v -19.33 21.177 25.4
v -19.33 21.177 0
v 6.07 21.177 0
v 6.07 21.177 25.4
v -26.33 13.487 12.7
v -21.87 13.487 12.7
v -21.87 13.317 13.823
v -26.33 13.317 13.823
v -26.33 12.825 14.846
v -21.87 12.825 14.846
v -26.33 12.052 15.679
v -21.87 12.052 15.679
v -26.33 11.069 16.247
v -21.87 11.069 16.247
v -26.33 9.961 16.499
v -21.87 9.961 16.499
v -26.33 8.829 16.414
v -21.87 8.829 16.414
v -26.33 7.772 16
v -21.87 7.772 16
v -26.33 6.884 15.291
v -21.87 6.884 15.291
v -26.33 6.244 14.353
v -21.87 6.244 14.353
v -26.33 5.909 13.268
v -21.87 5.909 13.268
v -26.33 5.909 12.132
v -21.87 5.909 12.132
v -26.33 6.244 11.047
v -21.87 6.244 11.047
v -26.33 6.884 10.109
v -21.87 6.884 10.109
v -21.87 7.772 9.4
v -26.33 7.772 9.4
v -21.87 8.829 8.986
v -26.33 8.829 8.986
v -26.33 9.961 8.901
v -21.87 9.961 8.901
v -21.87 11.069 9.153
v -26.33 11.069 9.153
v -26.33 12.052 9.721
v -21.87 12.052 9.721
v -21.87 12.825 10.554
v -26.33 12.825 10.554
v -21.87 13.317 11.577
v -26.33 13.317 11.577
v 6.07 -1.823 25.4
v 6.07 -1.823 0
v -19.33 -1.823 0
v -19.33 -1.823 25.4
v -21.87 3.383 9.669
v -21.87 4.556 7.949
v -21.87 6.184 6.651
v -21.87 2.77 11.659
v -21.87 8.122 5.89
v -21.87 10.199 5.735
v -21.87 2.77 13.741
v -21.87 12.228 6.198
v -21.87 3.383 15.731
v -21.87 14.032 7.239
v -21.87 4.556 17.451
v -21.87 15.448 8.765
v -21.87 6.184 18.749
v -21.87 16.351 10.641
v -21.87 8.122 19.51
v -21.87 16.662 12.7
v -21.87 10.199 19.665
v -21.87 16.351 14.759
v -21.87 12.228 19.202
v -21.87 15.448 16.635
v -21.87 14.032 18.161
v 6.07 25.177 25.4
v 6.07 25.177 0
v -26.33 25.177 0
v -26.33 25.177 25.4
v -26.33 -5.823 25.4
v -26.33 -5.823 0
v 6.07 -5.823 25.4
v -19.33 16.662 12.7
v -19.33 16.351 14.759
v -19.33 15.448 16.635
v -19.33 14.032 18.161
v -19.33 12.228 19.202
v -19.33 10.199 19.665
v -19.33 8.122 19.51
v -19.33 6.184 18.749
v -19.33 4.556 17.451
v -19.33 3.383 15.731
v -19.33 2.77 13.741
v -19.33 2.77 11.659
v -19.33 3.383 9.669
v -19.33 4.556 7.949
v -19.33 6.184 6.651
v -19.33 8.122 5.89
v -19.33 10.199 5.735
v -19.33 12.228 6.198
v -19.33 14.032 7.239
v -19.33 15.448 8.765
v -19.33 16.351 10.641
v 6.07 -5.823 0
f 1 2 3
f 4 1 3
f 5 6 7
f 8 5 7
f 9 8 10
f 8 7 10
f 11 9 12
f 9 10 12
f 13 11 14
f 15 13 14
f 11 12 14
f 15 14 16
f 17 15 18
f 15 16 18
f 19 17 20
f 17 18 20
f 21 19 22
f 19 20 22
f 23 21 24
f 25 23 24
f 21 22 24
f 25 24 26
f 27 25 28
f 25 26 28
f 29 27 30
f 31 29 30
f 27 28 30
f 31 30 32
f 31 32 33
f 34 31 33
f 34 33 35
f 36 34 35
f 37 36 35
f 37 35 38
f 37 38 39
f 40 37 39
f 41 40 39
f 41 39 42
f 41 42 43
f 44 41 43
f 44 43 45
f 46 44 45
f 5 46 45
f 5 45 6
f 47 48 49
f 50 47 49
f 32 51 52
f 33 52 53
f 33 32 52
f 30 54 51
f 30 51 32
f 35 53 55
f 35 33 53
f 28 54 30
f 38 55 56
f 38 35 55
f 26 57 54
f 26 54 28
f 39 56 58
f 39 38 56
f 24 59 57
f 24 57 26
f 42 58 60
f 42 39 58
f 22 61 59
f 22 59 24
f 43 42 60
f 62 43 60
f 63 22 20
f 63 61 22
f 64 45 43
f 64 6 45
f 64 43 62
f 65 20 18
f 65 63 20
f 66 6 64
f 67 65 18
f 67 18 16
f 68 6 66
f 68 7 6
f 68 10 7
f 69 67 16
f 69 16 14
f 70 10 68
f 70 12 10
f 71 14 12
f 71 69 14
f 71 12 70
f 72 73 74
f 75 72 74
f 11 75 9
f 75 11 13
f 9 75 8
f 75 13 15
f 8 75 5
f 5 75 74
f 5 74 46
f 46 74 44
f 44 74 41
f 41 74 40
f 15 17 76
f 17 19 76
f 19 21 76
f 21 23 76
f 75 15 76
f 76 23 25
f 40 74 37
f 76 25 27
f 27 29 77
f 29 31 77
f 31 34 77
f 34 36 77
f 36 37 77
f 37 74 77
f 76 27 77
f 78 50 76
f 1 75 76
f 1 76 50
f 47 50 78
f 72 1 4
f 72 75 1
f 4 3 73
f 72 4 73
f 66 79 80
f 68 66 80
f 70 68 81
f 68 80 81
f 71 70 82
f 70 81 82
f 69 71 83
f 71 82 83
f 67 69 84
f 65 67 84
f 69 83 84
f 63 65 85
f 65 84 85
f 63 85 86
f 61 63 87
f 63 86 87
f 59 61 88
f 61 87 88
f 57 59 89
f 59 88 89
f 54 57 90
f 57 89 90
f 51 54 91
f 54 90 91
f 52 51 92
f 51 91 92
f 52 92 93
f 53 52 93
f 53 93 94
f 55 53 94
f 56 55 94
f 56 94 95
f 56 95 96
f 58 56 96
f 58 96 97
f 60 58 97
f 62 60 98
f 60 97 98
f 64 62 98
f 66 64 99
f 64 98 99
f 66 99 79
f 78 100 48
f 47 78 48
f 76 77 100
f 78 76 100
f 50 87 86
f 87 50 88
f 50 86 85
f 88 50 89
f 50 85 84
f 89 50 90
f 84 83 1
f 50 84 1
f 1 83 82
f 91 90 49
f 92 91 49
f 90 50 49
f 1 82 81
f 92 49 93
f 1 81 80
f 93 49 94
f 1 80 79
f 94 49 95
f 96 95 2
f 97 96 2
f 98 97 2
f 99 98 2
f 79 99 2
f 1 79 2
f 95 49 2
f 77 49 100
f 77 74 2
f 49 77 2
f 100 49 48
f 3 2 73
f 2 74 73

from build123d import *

# Parameters (mm, degrees)
F1_DEPTH = 25.4
F2_R     = 6.985
F2_R_2   = 3.81
F3_DEPTH = 2.54
F4_DEPTH = 7


with BuildPart() as f1:
    # F0 (on Top) → F1 (new body)
    with BuildSketch(Plane.XY):
        Polygon((-19.32979, -1.823446), (-19.32979, 21.176554), (6.07021, 21.176554), (6.07021, 25.176554), (-26.32979, 25.176554), (-26.32979, -5.823446), (6.07021, -5.823446), (6.07021, -1.823446), align=None)
    extrude(amount=F1_DEPTH)

    # F2 (on face) → F3 (cut)
    with BuildSketch(Plane.YZ.offset(-19.32979)):
        with Locations((9.676554, 12.7)):
            Circle(F2_R)
        with Locations((9.676554, 12.7)):
            Circle(F2_R_2, mode=Mode.SUBTRACT)
        with Locations((9.676554, 12.7)):
            Circle(F2_R_2)
    extrude(amount=-F3_DEPTH, mode=Mode.SUBTRACT)

    # F2 (on face) → F4 (cut, through all)
    with BuildSketch(Plane.YZ.offset(-19.32979)):
        with Locations((9.676554, 12.7)):
            Circle(F2_R_2)
    extrude(amount=-F4_DEPTH, mode=Mode.SUBTRACT)


solid = f1.part
